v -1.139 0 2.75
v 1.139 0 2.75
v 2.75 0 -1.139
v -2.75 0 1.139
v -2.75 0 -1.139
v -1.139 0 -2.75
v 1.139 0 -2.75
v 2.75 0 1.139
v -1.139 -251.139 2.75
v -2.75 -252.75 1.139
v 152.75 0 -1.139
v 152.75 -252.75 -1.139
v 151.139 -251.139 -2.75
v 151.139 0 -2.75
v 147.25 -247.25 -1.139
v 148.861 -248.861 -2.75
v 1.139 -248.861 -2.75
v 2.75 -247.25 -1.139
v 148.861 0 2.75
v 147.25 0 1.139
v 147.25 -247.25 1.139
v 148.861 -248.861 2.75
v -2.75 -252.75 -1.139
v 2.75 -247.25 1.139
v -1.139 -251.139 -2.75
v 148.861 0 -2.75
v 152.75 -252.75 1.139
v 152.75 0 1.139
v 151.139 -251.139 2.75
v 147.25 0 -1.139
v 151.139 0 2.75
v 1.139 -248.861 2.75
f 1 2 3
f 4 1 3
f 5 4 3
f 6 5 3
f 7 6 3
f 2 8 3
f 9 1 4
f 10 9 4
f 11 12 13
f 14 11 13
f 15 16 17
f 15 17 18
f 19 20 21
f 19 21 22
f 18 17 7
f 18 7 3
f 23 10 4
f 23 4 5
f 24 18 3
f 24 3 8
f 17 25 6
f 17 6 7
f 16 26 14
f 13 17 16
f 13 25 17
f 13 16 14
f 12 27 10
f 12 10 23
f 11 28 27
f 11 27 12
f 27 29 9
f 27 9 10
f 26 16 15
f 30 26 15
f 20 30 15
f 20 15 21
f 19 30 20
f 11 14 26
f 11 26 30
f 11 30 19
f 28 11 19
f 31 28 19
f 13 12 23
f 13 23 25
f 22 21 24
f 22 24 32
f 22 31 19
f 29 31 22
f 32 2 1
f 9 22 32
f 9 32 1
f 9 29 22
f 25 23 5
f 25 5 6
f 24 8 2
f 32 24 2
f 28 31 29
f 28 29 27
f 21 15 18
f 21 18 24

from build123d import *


with BuildPart() as f2:
    # F2: sweep along a path in F0
    with BuildLine(Plane.XY) as f2_path:
        Line((0, 0), (0, -250))
        Line((0, -250), (150, -250))
        Line((150, -250), (150, 0))
    # F1 (on Front) → F2 (sweep)
    with BuildSketch(Plane.XZ):
        Polygon((1.1390872965, 2.75), (-1.1390872965, 2.75), (-2.75, 1.1390872965), (-2.75, -1.1390872965), (-1.1390872965, -2.75), (1.1390872965, -2.75), (2.75, -1.1390872965), (2.75, 1.1390872965), align=None)
    sweep(path=f2_path.line, transition=Transition.RIGHT)


solid = f2.part
